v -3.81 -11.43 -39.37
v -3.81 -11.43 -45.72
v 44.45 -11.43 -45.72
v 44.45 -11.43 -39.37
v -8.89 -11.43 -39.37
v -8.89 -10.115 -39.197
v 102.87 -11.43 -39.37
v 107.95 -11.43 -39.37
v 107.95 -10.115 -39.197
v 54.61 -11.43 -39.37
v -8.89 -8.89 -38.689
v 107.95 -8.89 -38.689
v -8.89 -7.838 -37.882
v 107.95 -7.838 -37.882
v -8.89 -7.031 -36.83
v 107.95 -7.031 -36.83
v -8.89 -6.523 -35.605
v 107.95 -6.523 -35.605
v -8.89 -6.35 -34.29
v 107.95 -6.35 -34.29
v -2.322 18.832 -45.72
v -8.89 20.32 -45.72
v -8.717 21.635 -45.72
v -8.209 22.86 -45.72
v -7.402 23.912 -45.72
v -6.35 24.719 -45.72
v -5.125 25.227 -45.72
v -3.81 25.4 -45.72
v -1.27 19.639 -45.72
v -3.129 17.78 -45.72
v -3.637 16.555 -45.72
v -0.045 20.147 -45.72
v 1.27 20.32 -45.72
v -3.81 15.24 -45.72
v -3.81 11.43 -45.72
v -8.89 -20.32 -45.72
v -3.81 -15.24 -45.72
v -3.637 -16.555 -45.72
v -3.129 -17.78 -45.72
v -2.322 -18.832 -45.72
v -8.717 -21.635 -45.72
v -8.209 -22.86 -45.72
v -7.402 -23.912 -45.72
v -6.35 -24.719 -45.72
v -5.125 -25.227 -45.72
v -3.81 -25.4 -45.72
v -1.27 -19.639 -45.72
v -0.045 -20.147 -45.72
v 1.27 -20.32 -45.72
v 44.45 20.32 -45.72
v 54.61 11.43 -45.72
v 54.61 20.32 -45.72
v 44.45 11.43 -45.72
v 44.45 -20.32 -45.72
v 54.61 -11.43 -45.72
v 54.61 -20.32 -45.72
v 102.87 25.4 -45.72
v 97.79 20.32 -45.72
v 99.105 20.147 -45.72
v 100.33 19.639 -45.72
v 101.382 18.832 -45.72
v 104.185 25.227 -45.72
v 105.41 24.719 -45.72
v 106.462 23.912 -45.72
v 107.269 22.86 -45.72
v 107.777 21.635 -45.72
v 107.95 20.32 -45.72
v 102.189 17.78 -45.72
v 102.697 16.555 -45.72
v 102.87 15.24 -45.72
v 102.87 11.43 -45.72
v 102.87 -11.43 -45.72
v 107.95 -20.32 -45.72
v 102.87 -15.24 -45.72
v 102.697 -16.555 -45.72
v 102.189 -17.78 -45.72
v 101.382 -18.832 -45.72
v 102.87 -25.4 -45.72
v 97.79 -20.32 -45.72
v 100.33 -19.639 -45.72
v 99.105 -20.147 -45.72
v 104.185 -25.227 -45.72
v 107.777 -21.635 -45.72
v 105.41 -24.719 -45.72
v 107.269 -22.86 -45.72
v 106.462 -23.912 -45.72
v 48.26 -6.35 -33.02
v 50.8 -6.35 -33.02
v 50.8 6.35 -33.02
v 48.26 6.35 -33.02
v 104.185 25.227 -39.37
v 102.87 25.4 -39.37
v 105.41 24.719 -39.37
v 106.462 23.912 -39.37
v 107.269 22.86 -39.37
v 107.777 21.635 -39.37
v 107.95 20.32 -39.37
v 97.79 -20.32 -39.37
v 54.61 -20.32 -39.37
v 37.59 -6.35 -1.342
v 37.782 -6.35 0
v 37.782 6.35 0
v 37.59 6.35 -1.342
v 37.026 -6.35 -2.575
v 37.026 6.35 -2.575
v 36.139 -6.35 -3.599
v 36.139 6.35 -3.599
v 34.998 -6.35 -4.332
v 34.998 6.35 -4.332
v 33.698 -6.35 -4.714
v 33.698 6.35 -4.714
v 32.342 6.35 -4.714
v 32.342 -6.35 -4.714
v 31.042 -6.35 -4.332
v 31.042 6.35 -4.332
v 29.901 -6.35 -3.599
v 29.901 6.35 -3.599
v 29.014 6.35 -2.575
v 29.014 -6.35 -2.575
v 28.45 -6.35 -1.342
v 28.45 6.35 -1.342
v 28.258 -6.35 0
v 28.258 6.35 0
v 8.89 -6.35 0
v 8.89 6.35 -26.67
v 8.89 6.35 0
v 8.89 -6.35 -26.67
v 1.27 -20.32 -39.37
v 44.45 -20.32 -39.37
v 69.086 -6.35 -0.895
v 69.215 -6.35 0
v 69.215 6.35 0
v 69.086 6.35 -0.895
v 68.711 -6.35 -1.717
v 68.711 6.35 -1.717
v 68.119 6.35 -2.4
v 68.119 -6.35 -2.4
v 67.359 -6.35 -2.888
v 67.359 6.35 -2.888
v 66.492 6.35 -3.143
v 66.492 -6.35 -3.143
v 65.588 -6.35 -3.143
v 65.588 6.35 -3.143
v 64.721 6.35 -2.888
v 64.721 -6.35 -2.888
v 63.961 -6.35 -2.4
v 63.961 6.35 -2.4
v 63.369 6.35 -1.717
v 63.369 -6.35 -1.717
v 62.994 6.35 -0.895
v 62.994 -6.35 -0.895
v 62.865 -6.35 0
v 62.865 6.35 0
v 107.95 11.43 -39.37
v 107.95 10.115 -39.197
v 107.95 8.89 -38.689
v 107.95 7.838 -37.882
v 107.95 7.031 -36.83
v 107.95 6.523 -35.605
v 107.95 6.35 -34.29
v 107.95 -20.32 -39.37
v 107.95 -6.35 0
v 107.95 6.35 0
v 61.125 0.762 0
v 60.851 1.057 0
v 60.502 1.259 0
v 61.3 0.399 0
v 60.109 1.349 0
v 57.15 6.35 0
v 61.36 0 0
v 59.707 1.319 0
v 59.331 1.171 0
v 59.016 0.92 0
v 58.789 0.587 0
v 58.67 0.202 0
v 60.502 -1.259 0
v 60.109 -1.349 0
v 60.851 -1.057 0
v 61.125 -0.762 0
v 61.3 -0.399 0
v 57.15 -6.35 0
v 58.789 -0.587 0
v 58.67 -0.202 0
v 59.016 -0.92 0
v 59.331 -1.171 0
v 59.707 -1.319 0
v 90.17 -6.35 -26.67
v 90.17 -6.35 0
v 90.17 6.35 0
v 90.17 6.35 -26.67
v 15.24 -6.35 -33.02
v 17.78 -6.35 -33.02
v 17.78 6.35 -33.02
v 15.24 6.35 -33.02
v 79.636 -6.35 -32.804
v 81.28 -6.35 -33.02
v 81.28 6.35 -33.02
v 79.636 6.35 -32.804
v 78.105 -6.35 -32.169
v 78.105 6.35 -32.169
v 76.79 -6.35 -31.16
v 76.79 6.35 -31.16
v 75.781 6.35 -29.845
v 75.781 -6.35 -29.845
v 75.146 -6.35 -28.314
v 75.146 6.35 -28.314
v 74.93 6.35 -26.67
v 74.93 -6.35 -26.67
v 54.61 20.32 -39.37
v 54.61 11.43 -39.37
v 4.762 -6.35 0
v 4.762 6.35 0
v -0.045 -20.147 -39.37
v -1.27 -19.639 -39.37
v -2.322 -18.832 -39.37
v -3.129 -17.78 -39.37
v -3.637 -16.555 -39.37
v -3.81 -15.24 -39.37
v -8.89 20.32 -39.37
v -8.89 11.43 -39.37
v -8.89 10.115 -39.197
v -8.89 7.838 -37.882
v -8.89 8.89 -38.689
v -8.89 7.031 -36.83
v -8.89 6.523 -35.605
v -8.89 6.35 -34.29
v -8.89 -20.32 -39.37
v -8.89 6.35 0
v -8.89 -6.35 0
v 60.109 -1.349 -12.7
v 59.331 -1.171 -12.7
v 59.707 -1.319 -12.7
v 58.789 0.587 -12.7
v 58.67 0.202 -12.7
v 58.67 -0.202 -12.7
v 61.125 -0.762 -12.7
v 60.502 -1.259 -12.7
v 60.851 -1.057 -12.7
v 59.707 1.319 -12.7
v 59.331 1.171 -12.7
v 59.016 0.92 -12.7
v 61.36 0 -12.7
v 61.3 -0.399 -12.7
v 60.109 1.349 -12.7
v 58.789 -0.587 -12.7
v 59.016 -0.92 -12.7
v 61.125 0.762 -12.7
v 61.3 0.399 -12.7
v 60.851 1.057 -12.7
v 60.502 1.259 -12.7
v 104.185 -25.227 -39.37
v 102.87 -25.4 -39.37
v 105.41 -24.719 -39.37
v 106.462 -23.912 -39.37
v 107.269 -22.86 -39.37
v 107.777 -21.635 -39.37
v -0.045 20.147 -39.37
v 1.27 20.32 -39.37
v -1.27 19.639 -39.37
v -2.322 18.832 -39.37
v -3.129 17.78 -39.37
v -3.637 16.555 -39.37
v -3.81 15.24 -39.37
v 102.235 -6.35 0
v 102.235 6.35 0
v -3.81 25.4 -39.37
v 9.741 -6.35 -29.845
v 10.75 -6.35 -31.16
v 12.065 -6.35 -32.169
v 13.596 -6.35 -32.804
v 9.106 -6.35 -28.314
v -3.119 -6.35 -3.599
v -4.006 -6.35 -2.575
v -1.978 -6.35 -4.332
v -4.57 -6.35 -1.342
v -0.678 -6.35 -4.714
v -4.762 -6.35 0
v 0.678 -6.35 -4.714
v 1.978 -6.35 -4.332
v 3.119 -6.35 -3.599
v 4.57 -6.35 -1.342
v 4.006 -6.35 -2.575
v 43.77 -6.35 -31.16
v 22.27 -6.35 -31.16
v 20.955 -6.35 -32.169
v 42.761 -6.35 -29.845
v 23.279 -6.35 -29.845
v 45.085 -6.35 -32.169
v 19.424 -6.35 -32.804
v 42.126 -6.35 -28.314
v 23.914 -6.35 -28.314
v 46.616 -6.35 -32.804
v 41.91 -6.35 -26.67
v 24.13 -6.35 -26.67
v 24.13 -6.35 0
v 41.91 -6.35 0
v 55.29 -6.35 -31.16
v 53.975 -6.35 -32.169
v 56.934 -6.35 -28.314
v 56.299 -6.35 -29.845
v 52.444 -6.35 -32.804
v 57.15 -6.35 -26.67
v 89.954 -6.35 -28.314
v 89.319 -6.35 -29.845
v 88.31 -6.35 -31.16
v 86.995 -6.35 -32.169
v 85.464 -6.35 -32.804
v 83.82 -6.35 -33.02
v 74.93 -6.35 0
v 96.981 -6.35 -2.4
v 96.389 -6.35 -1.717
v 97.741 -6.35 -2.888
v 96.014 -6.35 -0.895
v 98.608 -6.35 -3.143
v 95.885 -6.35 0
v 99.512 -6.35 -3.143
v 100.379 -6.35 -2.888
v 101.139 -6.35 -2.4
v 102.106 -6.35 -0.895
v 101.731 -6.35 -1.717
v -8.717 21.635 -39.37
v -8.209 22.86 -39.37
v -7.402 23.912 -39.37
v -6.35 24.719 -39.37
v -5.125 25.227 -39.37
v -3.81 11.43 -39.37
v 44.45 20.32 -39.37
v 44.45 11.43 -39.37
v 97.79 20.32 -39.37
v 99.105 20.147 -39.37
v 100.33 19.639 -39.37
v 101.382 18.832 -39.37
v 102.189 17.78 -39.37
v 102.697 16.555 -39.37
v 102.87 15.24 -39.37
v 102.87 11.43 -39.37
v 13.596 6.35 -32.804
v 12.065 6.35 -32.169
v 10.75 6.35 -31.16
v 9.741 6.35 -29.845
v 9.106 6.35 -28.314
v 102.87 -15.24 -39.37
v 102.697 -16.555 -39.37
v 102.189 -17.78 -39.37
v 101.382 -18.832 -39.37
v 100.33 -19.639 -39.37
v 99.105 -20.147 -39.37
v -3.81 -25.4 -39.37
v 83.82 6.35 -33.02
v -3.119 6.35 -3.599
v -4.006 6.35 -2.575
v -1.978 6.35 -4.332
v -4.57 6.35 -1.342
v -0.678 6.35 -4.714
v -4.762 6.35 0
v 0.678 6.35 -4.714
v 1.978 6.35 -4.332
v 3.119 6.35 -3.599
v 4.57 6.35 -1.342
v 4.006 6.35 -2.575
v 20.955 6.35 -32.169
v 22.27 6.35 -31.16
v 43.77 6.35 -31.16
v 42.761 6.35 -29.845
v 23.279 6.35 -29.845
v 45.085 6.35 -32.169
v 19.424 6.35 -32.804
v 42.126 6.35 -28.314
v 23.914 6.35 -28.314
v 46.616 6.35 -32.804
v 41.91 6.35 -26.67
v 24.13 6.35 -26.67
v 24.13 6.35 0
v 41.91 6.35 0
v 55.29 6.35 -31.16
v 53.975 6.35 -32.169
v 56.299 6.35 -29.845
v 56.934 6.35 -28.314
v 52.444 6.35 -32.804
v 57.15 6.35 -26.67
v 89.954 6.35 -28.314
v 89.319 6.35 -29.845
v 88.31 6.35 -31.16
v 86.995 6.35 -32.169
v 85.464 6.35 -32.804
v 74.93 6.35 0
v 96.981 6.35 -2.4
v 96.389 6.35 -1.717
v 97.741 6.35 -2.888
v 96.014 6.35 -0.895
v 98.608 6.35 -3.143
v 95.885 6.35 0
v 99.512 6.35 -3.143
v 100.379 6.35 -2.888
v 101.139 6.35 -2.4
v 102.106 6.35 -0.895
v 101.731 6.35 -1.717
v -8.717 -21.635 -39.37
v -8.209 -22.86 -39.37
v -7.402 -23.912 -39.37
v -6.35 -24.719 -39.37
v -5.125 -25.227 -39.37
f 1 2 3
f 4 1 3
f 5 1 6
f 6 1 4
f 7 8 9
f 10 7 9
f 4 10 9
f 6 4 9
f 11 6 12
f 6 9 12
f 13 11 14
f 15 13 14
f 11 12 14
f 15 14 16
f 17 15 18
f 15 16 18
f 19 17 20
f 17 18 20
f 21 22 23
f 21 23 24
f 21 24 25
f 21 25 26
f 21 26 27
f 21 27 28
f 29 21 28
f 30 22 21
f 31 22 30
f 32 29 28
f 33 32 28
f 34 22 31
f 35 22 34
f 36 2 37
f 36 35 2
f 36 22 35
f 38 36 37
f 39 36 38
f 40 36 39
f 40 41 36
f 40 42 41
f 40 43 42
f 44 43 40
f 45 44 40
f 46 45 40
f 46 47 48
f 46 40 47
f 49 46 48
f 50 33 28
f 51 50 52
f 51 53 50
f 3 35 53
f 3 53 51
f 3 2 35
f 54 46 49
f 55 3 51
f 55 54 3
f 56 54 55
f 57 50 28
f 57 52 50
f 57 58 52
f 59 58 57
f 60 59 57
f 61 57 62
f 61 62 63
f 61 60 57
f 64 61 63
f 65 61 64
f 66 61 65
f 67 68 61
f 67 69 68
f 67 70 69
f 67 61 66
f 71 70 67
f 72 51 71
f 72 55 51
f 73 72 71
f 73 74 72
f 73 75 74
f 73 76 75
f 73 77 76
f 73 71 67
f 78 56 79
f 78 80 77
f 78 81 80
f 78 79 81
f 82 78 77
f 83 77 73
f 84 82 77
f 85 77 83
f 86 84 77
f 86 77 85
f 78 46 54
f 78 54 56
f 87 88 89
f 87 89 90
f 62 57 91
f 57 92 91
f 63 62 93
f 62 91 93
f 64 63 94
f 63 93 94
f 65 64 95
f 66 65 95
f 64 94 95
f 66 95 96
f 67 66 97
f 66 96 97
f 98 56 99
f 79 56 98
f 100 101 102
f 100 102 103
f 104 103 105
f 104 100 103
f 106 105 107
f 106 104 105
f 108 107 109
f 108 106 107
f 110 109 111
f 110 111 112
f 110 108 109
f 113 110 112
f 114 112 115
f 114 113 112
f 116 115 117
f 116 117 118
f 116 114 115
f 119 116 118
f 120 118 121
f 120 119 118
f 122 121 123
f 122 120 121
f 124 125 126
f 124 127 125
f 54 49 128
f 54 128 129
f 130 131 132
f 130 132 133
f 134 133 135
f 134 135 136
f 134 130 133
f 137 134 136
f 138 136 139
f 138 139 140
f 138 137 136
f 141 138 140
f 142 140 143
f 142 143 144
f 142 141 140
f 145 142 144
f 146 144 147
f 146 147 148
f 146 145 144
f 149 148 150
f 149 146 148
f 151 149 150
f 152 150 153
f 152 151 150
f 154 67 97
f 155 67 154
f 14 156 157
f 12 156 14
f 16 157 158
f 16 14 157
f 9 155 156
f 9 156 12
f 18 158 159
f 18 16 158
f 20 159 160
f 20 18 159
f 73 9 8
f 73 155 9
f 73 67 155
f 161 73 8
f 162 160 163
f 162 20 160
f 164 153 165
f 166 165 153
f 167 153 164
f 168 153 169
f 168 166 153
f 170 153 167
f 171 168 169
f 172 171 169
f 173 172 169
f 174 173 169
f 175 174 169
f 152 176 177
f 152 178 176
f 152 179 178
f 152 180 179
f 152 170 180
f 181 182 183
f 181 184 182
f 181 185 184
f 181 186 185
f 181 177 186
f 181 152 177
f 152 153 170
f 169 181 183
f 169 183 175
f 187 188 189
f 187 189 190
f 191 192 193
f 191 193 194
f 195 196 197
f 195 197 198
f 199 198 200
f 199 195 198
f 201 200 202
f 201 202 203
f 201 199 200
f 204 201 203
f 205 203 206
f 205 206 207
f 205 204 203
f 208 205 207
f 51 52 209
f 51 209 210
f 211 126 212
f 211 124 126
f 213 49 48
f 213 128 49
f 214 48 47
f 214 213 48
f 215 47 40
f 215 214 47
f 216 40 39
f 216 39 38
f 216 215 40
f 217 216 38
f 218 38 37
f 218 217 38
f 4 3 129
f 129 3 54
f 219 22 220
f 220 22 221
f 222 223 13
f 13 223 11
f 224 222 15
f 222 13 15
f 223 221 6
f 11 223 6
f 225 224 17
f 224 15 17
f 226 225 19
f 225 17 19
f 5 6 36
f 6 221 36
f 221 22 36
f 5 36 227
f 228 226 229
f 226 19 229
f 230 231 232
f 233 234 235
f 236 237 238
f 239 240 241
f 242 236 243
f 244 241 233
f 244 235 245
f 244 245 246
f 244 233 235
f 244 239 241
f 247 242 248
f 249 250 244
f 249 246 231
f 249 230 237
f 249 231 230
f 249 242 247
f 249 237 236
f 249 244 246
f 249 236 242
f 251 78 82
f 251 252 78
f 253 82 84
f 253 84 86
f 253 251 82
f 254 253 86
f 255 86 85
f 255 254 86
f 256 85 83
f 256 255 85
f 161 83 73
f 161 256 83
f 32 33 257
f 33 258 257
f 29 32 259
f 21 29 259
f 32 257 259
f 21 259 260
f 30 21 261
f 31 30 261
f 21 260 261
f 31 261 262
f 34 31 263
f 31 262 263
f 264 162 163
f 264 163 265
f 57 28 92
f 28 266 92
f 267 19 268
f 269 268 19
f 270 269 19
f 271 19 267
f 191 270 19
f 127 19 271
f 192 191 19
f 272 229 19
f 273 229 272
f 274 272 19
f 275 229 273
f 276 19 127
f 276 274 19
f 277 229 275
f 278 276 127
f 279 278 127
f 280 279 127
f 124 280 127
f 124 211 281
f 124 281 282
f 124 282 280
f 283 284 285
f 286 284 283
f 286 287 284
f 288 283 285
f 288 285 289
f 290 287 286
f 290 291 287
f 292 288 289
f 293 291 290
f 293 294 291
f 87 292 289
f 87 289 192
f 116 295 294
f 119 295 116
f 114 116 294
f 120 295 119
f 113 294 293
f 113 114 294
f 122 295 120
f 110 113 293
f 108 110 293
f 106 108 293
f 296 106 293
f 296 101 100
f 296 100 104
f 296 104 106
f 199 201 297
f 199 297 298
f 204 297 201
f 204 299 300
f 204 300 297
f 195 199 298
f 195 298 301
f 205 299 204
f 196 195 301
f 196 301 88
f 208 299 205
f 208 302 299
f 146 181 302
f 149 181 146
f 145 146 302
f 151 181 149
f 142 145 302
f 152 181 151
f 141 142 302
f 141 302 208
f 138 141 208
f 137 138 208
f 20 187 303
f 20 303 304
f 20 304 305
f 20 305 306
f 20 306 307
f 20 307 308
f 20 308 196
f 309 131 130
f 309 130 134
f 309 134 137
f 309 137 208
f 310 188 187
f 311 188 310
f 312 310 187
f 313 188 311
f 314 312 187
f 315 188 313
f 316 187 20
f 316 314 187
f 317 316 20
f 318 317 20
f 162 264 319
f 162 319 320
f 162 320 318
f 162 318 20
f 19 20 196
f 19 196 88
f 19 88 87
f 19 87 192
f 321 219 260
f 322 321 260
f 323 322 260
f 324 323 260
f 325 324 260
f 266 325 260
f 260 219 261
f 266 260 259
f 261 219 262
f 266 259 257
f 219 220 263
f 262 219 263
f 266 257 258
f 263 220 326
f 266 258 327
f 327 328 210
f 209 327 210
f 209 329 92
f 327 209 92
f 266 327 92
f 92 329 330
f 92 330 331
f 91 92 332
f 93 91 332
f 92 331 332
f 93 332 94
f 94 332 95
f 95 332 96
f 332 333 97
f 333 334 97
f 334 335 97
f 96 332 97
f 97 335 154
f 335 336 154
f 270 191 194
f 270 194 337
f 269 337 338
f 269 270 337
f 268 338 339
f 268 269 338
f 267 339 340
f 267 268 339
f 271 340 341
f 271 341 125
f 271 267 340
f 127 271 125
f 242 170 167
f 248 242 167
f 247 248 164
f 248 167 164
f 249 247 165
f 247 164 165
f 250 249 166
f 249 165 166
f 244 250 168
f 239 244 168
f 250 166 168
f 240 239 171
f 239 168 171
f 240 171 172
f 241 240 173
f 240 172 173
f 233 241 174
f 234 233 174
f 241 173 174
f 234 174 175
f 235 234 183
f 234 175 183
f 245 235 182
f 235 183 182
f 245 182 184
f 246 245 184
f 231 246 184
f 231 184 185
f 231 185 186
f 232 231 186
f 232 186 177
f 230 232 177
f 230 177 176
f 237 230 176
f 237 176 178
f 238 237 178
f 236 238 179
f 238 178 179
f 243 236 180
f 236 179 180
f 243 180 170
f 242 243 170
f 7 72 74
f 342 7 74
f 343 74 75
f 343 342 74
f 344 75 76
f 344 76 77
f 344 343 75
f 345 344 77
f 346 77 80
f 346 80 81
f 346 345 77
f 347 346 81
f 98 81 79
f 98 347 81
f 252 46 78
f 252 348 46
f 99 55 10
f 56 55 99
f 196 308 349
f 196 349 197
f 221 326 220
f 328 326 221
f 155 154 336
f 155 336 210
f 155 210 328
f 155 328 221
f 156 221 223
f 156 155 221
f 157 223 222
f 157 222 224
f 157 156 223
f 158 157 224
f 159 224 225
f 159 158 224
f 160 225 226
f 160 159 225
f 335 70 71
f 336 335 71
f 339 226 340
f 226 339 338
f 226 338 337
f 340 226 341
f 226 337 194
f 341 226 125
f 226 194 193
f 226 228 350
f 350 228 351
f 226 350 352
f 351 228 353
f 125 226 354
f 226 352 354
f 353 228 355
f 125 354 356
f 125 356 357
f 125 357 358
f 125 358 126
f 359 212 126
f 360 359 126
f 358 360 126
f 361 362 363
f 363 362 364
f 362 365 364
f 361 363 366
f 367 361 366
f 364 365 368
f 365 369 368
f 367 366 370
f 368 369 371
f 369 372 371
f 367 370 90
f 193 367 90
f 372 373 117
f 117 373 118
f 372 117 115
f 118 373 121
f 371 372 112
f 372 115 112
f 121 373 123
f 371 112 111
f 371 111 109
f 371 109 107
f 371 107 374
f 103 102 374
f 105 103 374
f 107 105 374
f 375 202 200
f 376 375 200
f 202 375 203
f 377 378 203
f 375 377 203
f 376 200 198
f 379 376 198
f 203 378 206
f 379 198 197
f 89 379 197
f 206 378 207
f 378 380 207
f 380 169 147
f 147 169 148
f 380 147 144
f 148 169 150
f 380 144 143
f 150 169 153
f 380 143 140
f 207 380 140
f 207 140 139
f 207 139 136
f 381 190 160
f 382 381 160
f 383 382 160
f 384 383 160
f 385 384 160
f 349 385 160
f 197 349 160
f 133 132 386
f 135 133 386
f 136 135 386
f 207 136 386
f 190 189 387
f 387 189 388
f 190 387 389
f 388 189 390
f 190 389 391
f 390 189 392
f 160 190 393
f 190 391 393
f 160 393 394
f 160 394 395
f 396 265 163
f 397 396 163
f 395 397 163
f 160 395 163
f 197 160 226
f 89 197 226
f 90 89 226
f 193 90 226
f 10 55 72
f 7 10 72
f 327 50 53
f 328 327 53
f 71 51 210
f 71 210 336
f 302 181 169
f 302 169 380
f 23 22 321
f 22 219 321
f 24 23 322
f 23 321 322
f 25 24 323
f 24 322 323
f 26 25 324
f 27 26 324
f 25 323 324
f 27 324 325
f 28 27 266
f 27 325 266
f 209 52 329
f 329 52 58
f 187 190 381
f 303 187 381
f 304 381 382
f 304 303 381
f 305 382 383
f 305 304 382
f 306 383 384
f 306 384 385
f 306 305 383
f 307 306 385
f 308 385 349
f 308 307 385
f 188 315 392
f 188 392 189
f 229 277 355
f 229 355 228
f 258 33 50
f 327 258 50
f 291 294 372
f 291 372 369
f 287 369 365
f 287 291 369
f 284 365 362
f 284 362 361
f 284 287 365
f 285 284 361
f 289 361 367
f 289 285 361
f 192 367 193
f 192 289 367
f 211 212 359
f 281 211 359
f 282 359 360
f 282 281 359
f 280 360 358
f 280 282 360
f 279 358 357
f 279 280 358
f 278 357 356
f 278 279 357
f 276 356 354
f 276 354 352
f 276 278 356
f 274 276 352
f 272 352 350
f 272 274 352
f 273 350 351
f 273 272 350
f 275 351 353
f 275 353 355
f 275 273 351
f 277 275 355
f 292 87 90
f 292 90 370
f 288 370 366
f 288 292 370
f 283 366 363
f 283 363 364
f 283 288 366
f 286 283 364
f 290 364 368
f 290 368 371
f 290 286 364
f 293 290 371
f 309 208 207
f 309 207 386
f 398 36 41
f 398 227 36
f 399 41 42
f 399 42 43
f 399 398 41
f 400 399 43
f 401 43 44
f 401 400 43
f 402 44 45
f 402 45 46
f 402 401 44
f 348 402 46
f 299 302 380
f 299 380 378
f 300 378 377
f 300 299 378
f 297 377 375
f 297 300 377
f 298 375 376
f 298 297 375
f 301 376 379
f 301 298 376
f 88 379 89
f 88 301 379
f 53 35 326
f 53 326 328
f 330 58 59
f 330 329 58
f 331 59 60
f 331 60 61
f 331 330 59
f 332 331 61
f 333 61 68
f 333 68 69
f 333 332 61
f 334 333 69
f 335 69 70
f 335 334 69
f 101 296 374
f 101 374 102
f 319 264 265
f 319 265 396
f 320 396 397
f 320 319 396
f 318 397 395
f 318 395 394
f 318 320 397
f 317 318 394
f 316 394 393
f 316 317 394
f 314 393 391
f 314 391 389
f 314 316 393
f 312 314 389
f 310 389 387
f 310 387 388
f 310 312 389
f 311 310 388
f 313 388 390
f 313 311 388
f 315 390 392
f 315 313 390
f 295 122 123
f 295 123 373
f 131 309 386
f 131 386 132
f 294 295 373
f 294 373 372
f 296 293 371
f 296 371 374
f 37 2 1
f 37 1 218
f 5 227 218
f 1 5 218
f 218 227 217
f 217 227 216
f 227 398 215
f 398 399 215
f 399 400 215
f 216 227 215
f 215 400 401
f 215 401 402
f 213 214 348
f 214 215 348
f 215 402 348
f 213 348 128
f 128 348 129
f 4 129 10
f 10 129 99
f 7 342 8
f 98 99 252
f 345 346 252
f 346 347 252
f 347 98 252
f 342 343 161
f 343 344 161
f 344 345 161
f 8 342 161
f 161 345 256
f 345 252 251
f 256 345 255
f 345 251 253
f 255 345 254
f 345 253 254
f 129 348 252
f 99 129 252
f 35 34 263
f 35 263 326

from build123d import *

# Parameters (mm, degrees)
F1_DEPTH = 6.35
F0_W     = 116.84
F0_H     = 6.35
F2_DEPTH = 25.4
F3_R     = 5.08
F4_W     = 48.26
F4_H     = 8.89
F5_DEPTH = 25.4
F6_R     = 5.08
F7_R     = 1.35255
F8_DEPTH = 12.7


with BuildPart() as f1:
    # F0 (on Front) → F1 (new body, symmetric)
    with BuildSketch(Plane.XZ):
        with BuildLine():
            ThreePointArc((4.7625, 0), (0, -4.7625), (-4.7625, 0))
            Line((-4.7625, 0), (-8.89, 0))
            Line((-8.89, 0), (-8.89, -39.37))
            Line((-8.89, -39.37), (107.95, -39.37))
            Line((107.95, -39.37), (107.95, 0))
            Line((107.95, 0), (102.235, 0))
            ThreePointArc((102.235, 0), (99.06, -3.175), (95.885, 0))
            Line((95.885, 0), (90.17, 0))
            Line((90.17, 0), (90.17, -26.67))
            ThreePointArc((90.17, -26.67), (88.310128, -31.160128), (83.82, -33.02))
            Line((83.82, -33.02), (81.28, -33.02))
            ThreePointArc((81.28, -33.02), (76.789872, -31.160128), (74.93, -26.67))
            Line((74.93, -26.67), (74.93, 0))
            Line((74.93, 0), (69.215, 0))
            ThreePointArc((69.215, 0), (66.04, -3.175), (62.865, 0))
            Line((62.865, 0), (57.15, 0))
            Line((57.15, 0), (57.15, -26.67))
            ThreePointArc((57.15, -26.67), (55.290128, -31.160128), (50.8, -33.02))
            Line((50.8, -33.02), (48.26, -33.02))
            ThreePointArc((48.26, -33.02), (43.769872, -31.160128), (41.91, -26.67))
            Line((41.91, -26.67), (41.91, 0))
            Line((41.91, 0), (37.7825, 0))
            ThreePointArc((37.7825, 0), (33.02, -4.7625), (28.2575, 0))
            Line((28.2575, 0), (24.13, 0))
            Line((24.13, 0), (24.13, -26.67))
            ThreePointArc((24.13, -26.67), (22.270128, -31.160128), (17.78, -33.02))
            Line((17.78, -33.02), (15.24, -33.02))
            ThreePointArc((15.24, -33.02), (10.749872, -31.160128), (8.89, -26.67))
            Line((8.89, -26.67), (8.89, 0))
            Line((8.89, 0), (4.7625, 0))
        make_face()
    extrude(amount=F1_DEPTH, both=True)

    # F0 (on Front) → F2 (join, symmetric)
    with BuildSketch(Plane.XZ):
        with Locations((49.53, -42.545)):
            Rectangle(F0_W, F0_H)
    extrude(amount=F2_DEPTH, both=True)

    # F3
    f3_edges = [f1.edges().sort_by_distance(p)[0] for p in [
        (49.53, -6.35, -39.37),
        (49.53, 6.35, -39.37),
        (107.95, -25.4, -42.545),
        (-8.89, -25.4, -42.545),
        (107.95, 25.4, -42.545),
        (-8.89, 25.4, -42.545),
    ]]
    fillet(f3_edges, radius=F3_R)

    # F4 (on face) → F5 (cut)
    with BuildSketch(Plane(origin=(0, 0, -45.72), x_dir=(1, 0, 0), z_dir=(0, 0, -1))):
        with Locations((20.32, 15.875)):
            Rectangle(F4_W, F4_H)
        with Locations((78.74, 15.875)):
            Rectangle(F4_W, F4_H)
        with Locations((78.74, -15.875)):
            Rectangle(F4_W, F4_H)
        with Locations((20.32, -15.875)):
            Rectangle(F4_W, F4_H)
    extrude(amount=-F5_DEPTH, mode=Mode.SUBTRACT)

    # F6
    f6_edges = [f1.edges().sort_by_distance(p)[0] for p in [
        (-3.81, 20.32, -42.545),
        (102.87, 20.32, -42.545),
        (-3.81, -20.32, -42.545),
        (102.87, -20.32, -42.545),
    ]]
    fillet(f6_edges, radius=F6_R)

    # F7 (on face) → F8 (cut)
    with BuildSketch(Plane.XY):
        with Locations((60.0075, 0)):
            Circle(F7_R)
    extrude(amount=-F8_DEPTH, mode=Mode.SUBTRACT)


solid = f1.part
